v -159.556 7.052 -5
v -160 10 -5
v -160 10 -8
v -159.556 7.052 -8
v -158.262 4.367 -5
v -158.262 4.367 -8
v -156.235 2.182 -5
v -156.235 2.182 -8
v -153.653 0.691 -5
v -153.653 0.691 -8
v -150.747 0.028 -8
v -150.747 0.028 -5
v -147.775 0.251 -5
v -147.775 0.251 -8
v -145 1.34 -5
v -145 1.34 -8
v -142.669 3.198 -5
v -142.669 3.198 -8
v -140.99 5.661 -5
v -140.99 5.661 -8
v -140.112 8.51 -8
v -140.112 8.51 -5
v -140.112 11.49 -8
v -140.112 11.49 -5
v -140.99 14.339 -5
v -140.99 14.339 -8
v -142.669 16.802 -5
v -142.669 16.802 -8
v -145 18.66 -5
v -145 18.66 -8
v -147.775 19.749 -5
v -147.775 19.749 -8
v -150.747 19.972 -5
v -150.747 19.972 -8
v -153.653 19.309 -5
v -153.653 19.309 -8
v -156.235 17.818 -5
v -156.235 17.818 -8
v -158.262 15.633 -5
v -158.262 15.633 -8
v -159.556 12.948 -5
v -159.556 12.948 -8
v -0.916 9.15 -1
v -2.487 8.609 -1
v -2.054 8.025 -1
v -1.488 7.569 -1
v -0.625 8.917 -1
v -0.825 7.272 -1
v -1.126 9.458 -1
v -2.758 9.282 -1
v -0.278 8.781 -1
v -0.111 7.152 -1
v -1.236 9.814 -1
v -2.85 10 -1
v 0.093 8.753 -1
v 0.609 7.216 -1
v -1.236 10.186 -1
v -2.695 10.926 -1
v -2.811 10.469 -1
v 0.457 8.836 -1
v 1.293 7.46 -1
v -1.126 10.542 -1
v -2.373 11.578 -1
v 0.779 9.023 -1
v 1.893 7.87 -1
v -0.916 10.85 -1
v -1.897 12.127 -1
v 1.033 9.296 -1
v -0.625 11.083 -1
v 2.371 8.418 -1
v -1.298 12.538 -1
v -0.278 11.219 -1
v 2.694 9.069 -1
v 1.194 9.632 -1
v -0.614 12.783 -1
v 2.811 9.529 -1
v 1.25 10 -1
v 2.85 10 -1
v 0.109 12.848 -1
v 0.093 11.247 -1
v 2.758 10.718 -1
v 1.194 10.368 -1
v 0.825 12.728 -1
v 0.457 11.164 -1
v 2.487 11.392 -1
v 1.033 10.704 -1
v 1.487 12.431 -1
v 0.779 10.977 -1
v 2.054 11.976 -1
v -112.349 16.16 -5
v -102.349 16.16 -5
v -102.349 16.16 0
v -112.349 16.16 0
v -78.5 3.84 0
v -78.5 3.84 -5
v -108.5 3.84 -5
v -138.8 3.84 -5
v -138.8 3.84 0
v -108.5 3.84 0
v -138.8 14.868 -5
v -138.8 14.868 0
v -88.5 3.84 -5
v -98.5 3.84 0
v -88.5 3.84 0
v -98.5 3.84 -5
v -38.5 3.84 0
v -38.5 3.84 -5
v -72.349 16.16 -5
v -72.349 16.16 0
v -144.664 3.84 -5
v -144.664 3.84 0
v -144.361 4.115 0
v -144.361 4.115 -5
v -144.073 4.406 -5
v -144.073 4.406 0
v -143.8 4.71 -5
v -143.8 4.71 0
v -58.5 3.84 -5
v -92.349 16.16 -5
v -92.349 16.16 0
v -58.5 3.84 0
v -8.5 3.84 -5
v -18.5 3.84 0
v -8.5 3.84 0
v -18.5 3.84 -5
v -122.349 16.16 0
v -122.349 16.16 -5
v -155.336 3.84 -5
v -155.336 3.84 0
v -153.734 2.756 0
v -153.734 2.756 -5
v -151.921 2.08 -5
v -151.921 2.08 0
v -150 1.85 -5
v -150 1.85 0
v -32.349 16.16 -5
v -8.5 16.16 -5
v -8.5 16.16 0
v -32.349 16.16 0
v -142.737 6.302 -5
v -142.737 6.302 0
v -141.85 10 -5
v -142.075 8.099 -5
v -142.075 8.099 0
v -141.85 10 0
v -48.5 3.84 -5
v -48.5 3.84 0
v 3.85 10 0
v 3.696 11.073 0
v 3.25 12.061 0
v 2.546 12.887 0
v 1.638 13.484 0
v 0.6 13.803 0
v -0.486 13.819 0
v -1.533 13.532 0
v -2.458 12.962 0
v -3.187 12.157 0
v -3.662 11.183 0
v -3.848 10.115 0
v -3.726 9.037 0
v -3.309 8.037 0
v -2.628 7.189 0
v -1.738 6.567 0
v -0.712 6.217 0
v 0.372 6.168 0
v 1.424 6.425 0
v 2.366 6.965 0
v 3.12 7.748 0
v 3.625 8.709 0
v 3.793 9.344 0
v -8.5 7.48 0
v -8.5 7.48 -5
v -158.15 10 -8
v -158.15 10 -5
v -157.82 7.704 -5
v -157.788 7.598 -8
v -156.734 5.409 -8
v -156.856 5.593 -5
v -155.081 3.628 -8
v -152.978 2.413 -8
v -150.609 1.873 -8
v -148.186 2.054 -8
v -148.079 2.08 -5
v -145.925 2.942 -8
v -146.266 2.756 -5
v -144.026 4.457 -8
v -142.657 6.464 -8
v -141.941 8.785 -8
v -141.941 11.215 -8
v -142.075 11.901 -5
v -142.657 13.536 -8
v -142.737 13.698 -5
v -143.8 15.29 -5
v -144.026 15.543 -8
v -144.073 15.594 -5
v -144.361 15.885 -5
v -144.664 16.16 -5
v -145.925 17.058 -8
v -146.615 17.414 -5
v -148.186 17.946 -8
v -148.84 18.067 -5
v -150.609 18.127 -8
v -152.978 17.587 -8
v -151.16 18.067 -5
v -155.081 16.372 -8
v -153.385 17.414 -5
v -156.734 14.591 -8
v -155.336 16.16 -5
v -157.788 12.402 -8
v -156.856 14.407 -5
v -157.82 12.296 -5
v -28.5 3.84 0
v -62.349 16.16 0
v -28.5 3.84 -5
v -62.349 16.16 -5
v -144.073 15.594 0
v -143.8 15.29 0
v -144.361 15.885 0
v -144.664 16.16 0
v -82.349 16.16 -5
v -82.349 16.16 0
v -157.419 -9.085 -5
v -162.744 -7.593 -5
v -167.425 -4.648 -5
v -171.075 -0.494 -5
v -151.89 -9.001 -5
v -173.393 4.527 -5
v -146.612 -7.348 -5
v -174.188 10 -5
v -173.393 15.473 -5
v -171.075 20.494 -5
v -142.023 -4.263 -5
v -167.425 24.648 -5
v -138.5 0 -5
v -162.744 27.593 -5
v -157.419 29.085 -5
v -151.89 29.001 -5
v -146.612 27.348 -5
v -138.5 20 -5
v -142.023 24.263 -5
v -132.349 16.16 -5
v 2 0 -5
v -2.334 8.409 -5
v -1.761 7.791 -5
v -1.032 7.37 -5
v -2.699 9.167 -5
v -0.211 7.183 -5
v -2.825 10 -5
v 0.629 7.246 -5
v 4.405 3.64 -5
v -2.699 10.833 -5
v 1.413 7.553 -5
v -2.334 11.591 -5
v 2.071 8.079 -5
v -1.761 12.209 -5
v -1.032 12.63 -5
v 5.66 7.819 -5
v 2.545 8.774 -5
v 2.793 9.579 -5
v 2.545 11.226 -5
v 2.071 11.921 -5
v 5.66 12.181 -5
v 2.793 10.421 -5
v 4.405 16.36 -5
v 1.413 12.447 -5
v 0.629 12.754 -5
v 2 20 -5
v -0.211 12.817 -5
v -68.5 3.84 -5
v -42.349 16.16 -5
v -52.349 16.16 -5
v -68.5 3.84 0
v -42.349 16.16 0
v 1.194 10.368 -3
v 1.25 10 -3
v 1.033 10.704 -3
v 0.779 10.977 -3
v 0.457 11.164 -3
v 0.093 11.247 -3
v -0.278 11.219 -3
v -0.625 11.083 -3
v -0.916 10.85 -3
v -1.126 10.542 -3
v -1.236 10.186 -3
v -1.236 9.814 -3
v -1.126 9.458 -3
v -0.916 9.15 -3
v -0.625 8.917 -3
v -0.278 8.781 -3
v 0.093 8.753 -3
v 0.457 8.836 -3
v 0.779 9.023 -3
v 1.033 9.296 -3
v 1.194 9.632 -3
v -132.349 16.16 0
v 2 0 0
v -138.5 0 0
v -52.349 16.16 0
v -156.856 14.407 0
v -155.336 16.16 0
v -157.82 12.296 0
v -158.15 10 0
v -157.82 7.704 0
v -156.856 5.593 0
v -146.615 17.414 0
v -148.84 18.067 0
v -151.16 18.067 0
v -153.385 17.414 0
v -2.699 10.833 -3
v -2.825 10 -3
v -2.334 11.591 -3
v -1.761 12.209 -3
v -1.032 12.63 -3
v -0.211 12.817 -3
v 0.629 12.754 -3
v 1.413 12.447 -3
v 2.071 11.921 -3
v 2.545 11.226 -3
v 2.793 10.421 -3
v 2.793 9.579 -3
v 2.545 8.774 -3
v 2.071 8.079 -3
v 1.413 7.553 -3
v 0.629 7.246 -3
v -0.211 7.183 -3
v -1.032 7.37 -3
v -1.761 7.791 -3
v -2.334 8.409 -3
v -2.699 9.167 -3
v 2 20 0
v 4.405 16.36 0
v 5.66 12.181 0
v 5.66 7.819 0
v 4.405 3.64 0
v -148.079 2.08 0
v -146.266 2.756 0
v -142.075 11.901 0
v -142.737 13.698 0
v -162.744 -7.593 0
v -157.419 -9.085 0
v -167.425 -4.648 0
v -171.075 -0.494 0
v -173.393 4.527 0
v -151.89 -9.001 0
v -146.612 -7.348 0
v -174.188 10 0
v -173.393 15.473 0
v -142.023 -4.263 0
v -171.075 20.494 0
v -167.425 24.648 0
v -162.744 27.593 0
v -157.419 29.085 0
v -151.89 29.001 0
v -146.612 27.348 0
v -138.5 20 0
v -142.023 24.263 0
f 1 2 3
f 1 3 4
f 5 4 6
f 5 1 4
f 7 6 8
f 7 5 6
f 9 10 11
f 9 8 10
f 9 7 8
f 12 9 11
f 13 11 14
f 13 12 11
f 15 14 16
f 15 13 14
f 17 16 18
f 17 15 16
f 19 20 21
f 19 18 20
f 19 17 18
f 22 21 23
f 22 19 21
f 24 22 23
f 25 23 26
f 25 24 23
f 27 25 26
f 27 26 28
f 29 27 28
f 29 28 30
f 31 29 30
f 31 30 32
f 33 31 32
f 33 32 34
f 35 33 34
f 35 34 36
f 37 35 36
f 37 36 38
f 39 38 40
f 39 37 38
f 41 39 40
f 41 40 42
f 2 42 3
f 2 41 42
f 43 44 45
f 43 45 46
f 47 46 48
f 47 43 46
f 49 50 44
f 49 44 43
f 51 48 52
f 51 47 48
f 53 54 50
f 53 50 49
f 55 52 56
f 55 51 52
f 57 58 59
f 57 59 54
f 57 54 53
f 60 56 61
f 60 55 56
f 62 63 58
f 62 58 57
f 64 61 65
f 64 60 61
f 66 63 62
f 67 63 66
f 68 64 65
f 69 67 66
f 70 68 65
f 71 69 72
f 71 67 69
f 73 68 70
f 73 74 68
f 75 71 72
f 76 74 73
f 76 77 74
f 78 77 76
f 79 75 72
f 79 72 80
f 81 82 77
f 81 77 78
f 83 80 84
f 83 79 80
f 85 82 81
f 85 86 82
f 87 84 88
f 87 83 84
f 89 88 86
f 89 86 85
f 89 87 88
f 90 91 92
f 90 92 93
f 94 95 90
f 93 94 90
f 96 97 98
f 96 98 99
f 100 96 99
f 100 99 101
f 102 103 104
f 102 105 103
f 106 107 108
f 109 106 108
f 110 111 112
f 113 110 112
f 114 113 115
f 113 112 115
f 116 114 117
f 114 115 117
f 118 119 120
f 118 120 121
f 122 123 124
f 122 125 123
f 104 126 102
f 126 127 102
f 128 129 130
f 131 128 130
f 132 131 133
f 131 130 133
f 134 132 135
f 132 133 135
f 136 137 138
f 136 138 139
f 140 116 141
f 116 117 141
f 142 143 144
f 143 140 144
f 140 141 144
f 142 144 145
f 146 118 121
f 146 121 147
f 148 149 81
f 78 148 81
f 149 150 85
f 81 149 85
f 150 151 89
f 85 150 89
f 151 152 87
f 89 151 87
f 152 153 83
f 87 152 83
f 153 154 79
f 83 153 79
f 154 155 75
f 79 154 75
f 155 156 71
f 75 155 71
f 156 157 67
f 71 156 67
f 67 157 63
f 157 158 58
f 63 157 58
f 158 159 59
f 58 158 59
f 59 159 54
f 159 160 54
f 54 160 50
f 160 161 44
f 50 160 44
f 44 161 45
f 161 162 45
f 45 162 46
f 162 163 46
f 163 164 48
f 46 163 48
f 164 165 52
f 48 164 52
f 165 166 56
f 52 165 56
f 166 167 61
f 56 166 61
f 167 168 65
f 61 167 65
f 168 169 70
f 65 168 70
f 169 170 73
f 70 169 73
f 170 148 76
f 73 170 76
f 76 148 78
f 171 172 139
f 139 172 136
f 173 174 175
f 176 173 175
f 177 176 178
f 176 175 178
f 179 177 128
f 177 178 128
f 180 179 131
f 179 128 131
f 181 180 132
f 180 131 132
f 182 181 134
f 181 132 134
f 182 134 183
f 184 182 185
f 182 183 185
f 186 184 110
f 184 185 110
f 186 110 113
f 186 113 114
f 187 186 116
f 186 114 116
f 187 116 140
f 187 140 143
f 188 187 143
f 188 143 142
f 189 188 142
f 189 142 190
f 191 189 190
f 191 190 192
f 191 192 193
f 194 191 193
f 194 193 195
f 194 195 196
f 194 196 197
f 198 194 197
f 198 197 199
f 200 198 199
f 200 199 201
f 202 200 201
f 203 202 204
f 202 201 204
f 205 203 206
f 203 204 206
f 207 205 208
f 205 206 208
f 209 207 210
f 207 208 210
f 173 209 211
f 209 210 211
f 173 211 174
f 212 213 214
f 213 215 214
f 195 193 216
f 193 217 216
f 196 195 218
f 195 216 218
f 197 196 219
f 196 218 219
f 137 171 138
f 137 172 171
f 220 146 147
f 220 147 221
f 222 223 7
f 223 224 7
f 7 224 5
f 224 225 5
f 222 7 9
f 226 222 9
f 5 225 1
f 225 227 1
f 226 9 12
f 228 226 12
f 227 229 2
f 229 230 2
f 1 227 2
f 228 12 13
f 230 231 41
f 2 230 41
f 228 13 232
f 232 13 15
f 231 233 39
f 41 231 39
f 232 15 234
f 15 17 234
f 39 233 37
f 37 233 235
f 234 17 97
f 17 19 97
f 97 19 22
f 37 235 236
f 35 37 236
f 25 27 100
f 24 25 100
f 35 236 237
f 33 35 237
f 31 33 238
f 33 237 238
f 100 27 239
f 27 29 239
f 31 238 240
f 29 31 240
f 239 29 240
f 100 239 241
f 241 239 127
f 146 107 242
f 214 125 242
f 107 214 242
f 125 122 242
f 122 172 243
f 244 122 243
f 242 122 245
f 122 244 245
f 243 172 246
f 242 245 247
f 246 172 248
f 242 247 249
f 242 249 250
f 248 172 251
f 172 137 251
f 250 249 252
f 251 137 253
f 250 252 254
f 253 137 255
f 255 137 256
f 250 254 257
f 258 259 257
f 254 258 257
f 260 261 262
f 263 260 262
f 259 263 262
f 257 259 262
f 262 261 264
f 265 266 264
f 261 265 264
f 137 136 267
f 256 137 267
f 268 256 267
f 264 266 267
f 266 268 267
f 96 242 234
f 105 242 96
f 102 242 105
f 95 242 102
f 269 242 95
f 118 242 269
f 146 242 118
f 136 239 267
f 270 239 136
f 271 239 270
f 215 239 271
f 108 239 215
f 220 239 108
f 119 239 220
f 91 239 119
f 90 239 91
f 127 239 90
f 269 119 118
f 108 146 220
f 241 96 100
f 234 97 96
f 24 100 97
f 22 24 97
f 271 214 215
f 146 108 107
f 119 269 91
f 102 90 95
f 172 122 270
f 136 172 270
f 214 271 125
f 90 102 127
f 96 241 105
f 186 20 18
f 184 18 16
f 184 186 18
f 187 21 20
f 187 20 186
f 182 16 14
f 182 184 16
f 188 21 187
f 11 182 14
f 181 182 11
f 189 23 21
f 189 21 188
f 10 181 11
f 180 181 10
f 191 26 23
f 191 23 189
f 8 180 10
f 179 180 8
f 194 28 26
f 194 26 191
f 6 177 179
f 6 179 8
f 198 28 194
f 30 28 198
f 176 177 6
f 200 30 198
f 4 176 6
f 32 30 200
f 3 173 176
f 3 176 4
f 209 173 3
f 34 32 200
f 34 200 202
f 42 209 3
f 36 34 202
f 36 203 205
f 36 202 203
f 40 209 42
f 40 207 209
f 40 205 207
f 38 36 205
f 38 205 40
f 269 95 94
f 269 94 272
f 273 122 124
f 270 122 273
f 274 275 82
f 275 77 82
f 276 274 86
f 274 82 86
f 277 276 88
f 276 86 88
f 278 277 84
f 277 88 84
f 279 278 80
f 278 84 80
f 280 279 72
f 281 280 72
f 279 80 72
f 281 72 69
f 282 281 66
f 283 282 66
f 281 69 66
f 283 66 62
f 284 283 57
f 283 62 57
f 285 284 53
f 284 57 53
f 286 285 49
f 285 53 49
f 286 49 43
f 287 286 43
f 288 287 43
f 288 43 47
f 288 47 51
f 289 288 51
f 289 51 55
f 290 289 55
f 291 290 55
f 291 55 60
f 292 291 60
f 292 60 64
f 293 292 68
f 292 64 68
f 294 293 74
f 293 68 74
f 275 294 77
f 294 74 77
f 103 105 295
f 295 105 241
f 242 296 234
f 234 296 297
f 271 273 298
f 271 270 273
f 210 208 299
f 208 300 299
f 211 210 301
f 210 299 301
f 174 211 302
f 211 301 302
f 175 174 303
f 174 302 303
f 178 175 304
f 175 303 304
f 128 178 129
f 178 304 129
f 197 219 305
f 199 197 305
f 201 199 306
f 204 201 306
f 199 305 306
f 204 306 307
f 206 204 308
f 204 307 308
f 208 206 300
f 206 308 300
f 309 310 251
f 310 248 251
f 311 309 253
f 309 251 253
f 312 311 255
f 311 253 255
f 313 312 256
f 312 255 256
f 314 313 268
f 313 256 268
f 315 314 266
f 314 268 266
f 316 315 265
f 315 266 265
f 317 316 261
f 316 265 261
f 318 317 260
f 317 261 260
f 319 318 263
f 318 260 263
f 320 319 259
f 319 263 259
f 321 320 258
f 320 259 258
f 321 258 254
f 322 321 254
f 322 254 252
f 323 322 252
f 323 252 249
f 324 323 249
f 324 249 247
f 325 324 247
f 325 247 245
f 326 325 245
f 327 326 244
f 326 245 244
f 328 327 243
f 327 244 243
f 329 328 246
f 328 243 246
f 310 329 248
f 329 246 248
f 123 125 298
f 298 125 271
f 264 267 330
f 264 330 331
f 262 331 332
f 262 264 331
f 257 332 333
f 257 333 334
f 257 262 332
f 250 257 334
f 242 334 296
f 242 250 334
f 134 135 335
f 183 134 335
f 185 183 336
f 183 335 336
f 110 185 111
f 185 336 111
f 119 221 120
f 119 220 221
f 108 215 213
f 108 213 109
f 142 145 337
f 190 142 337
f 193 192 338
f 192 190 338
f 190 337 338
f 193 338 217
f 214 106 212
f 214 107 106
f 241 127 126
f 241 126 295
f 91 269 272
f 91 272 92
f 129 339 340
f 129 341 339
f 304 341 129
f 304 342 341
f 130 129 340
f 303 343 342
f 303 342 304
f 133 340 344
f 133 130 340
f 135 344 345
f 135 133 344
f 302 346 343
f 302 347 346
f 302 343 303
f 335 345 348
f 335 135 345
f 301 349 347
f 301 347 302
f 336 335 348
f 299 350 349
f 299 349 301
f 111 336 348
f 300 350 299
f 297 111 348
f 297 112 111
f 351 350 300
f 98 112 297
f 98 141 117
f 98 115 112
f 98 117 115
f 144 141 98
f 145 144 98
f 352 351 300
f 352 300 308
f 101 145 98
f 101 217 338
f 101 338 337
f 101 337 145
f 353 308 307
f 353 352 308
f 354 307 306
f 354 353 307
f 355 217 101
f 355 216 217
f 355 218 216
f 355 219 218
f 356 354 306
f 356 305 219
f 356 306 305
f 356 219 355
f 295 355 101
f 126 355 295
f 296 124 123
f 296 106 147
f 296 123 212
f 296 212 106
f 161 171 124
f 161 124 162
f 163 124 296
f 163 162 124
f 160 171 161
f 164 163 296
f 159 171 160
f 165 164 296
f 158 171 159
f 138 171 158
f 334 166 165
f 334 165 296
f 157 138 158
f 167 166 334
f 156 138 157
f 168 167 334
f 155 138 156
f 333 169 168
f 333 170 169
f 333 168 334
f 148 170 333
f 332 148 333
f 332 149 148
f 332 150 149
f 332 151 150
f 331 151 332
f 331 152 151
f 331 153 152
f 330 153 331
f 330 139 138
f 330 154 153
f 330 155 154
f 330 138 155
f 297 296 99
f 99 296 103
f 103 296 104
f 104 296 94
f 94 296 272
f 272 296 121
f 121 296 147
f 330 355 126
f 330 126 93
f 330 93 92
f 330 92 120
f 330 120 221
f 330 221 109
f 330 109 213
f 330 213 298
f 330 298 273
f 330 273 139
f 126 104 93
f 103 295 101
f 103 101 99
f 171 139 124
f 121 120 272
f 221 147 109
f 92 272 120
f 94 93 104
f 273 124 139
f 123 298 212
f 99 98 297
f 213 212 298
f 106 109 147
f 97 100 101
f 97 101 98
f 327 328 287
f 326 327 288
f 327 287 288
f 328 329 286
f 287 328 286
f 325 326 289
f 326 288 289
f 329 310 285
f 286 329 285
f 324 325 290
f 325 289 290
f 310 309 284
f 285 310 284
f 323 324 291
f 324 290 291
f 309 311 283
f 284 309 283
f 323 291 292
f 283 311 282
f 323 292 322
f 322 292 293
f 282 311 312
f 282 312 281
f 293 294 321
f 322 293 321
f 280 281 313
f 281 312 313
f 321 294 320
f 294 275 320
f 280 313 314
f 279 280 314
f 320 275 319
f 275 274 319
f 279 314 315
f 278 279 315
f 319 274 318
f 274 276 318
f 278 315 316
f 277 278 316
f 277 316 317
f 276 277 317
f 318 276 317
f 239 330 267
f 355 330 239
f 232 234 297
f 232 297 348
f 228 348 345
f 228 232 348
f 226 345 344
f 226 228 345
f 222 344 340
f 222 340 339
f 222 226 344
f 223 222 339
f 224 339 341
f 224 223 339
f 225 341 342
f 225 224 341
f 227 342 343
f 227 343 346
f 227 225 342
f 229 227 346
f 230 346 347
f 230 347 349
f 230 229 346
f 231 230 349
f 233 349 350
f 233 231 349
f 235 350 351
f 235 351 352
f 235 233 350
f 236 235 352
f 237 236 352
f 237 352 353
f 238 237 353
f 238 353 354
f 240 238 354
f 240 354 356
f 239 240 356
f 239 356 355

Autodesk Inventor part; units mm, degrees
ref_plane "YZ Plane" through (0, 0, 0) normal (1, 0, 0) x (0, 1, 0)
ref_plane "XZ Plane" through (0, 0, 0) normal (0, 1, 0) x (-1, 0, 0)
sketch "Szkic1" plane through (0, 0, 0) normal (0, 1, 0) x (-1, 0, 0)
  line L0 (0, 0) -> (150, 0)
  line L1 (150, 0) -> (150, -5)
  line L2 (150, -5) -> (0, -5)
  line L3 (0, -5) -> (0, 0)
  dimension "d0" = 150
  dimension "d1" = 5
extrude "Wyciągnięcie proste1" add sketch "Szkic1" along normal blind 20
sketch "Szkic2" plane through (0, 0, -5) normal (0, 0, -1) x (-1, 0, 0)
  line L0 (0, 0) -> (0, 20) projected
  circle A0 centre (0, 10) radius 2.95
  line L1 (0, 20) -> (-2, 20)
  line L2 (0, 0) -> (-2, 0)
  arc A1 (-2, 20) -> (-2, 0) centre (9.1803, 10) ccw
  line L3 (0, 10) -> (150, 10)
  line L4 (150, 10) -> (138.5, 10)
  line L5 (138.5, 10) -> (170.9, 10)
  line L6 (150, 0) -> (150, 20) projected
  line L7 (138.5, 10) -> (170.9, 10) construction
  line L8 (138.5, 10) -> (170.9, 10)
  line L9 (170.9, 10) -> (170.9, 16.16)
  line L10 (170.9, 16.16) -> (138.5, 16.16)
  line L11 (138.5, 16.16) -> (138.5, 10)
  line L12 (138.5, 10) -> (170.9, 10)
  line L13 (170.9, 10) -> (170.9, 3.84)
  line L14 (170.9, 3.84) -> (138.5, 3.84)
  line L15 (138.5, 3.84) -> (138.5, 10)
  line L16 (0, 0) -> (150, 0) projected
  line L17 (0, 20) -> (150, 20) projected
  arc A2 (138.5, 0) -> (138.5, 20) centre (154.9429, 10) ccw
  point P0 (150, 3.84)
  point P1 (150, 16.16)
  point P2 (0, 7.05)
  point P3 (0, 12.95)
  dimension "d4" = 5.9
  dimension "d5" = 2
  dimension "d6" = 2
  dimension "d7" = 15
  dimension "d8" = 150
  dimension "d9" = 11.5
  dimension "d10" = 32.4
  dimension "d11" = 0
  dimension "d12" = 6.16
  dimension "d13" = 6.16
extrude "Wyciągnięcie proste2" add sketch "Szkic2" against normal blind 5 contours L2 A1 L1 L0 A0 | L16 L6 L14 L13 L9 L10 L17 A2
sketch "Szkic3" plane through (2, 20, -5) normal (0, 0, -1) x (-1, 0, 0)
  arc A0 (2, -7.05) -> (2, -12.95) centre (2, -10) ccw projected
  circle A1 centre (2, -10) radius 2.95
  line L0 (152, -16.16) -> (152, -3.84) projected
  line L1 (152, -16.16) -> (150.5, -16.16)
  line L2 (150.5, -16.16) -> (150.5, -3.84)
  line L3 (150.5, -3.84) -> (152, -3.84)
  line L4 (140.5, -16.16) -> (10.5, -16.16)
  line L5 (10.5, -16.16) -> (10.5, -3.84)
  line L6 (10.5, -3.84) -> (140.5, -3.84)
  line L7 (140.5, -3.84) -> (140.5, -16.16)
  line L8 (150.5, -16.16) -> (150.3, -16.16)
  line L9 (150.3, -16.16) -> (150.3, -3.84)
  line L10 (150.3, -3.84) -> (150.5, -3.84)
  line L11 (152, -16.16) -> (140.5, -16.16)
  line L12 (140.5, -16.16) -> (140.5, -3.84)
  line L13 (140.5, -3.84) -> (152, -3.84)
  line L14 (152, -3.84) -> (152, -16.16)
  point P0 (2, -20)
  dimension "d16" = 1.5
  dimension "d17" = 130
  dimension "d18" = 12.32
  dimension "d21" = 0.2
  dimension "d24" = 11.5
extrude "Wyciągnięcie proste3" cut sketch "Szkic3" against normal through all
sketch "Szkic5" plane through (2, 20, -5) normal (0, 0, -1) x (-1, 0, 0)
  circle A0 centre (2, -10) radius 2.95 projected
  line L0 (2, -10) -> (152, -10)
  line L1 (2, -10) -> (152, -10) construction
  circle A1 centre (152, -10) radius 5.0551
  line L2 (152, -10) -> (145.8, -10)
  line L3 (145.8, -10) -> (145.8, -3.84)
  line L4 (10.5, -3.84) -> (172.9, -3.84) projected
  line L5 (145.8, -3.84) -> (140.8, -3.84)
  line L6 (140.8, -3.84) -> (140.8, -16.16)
  line L7 (172.9, -16.16) -> (10.5, -16.16) projected
  line L8 (145.8, -10) -> (145.8, -16.16)
  line L9 (145.8, -16.16) -> (140.8, -16.16)
  line L10 (10.5, -16.16) -> (10.5, -3.84) projected
  line L11 (10.5, -16.16) -> (44.3489, -3.84)
  line L12 (10.5, -16.16) -> (46.5213, -16.16) construction
  line L13 (44.3489, -3.84) -> (54.3489, -3.84)
  line L14 (10.5, -16.16) -> (20.5, -16.16)
  line L15 (20.5, -16.16) -> (54.3489, -3.84)
  line L16 (20.5, -16.16) -> (30.5, -16.16)
  line L17 (54.3489, -3.84) -> (64.3489, -3.84)
  line L18 (64.3489, -3.84) -> (30.5, -16.16)
  line L19 (44.3489, -3.84) -> (34.3489, -3.84)
  line L20 (10.5, -16.16) -> (0.5, -16.16)
  line L21 (0.5, -16.16) -> (34.3489, -3.84)
  line L22 (40.5, -16.16) -> (74.3489, -3.84)
  line L23 (50.5, -16.16) -> (84.3489, -3.84)
  line L24 (94.3489, -3.84) -> (60.5, -16.16)
  line L25 (30.5, -16.16) -> (64.3489, -3.84)
  line L26 (70.5, -16.16) -> (104.3489, -3.84)
  line L27 (80.5, -16.16) -> (114.3489, -3.84)
  line L28 (124.3489, -3.84) -> (90.5, -16.16)
  line L29 (60.5, -16.16) -> (94.3489, -3.84)
  line L30 (100.5, -16.16) -> (134.3489, -3.84)
  line L31 (110.5, -16.16) -> (144.3489, -3.84)
  line L32 (90.5, -16.16) -> (124.3489, -3.84)
  point P0 (2, -20)
  point P1 (10.5, -12.5203)
  point P2 (60.5, -16.16)
  point P3 (140.8, -5.1317)
  dimension "d25" = 150
  dimension "d26" = 0
  dimension "d27" = 6.2
  dimension "d28" = 5
  dimension "d29" = 20
  dimension "d30" = 10
  dimension "d31" = 10
  dimension "d32" = 10
  dimension "d33" = 10
  dimension "d34" = 10
  dimension "d35" = 10
  dimension "d36" = 10
  dimension "d37" = 10
  dimension "d38" = 10
  dimension "d39" = 10
  dimension "d40" = 10
  dimension "d41" = 10
  dimension "d42" = 10
  dimension "d43" = 10
  dimension "d44" = 10
  dimension "d45" = 10
  dimension "d46" = 10
  dimension "d47" = 10
  dimension "d48" = 10
  dimension "d49" = 10
  dimension "d52" = 10
  dimension "d53" = 10
extrude "Wyciągnięcie proste4" add sketch "Szkic5" against normal blind 5 contours L21 L4 L11 L0 | L0 L11 L10 L21 | L15 L4 L18 L0 | L0 L18 L7 L15 | L22 L4 L23 L0 | L0 L23 L7 L22 | L24 L4 L26 L0 | L0 L26 L7 L24 | L27 L4 L28 L0 | L0 L28 L7 L27 | L30 L4 L6 L31 L0 | L0 L31 L7 L30 | L6 L31 L4 L3 L0 | L0 L8 L7 L6 | L6 L4 L31
sketch "Szkic6" plane through (-138.5, 0, 0) normal (0, 0, 1) x (1, 0, 0)
  circle A0 centre (138.5, 10) radius 2.95 projected
  circle A1 centre (138.5, 10) radius 2.85
  circle A2 centre (138.5, 10) radius 2.95
  point P0 (138.5, 0)
  dimension "d56" = 5.7
extrude "Wyciągnięcie proste5" add sketch "Szkic6" against normal blind 5
ref_plane "Płaszczyzna konstrukcyjna1" through (-138.5, 0, -1) normal (0, 0, 1) x (1, 0, 0)
sketch "Szkic7" plane through (-138.5, 0, -1) normal (0, 0, 1) x (1, 0, 0)
  circle A0 centre (138.5, 10) radius 2.85 projected
  circle A1 centre (138.5, 10) radius 1.25
  circle A2 centre (138.5, 10) radius 2.85
  point P0 (138.5, 0)
  dimension "d60" = 2.5
extrude "Wyciągnięcie proste6" add sketch "Szkic7" against normal blind 2
sketch "Szkic8" plane through (-138.5, 0, 0) normal (0, 0, 1) x (1, 0, 0)
  point P0 (138.5, 0)
sketch "Szkic9" plane through (-138.5, 0, 0) normal (0, 0, 1) x (1, 0, 0)
  circle A0 centre (138.5, 10) radius 1.25 projected
  line L0 (138.5, 10) -> (-11.5, 10)
  line L1 (138.5, 10) -> (288.5, 10) construction
  circle A1 centre (-11.5, 10) radius 8.15
  point P0 (138.5, 0)
  dimension "d63" = 150
  dimension "d64" = 180
  dimension "d65" = 16.3
extrude "Wyciągnięcie proste7" cut sketch "Szkic9" against normal through all contours A1
sketch "Szkic10" plane through (-138.5, 0, 0) normal (0, 0, 1) x (1, 0, 0)
  arc A0 (-5.3, 4.7102) -> (-5.3, 15.2898) centre (-11.5, 10) ccw projected
  circle A1 centre (-11.5, 10) radius 8.15
  line L0 (-32.5164, 20) -> (-2.9538, 20)
  line L1 (-2.9538, 20) -> (-2.9538, 1.85)
  line L2 (-2.9538, 1.85) -> (-32.5164, 1.85)
  line L3 (-32.5164, 1.85) -> (-32.5164, 20)
  point P0 (138.5, 0)
  point P1 (-11.5, 1.85)
  point P2 (-5.3, 15.2898)
extrude "Wyciągnięcie proste8" add sketch "Szkic10" against normal blind 5
sketch "Szkic11" plane through (2, 20, -5) normal (0, 0, -1) x (-1, 0, 0)
  circle A0 centre (152, -10) radius 8.15 projected
  circle A1 centre (152, -10) radius 8.15
  circle A2 centre (152, -10) radius 10
  point P0 (2, -20)
  dimension "d70" = 20
extrude "Wyciągnięcie proste9" add sketch "Szkic11" along normal blind 3
sketch "Szkic12" plane through (-138.5, 0, 0) normal (0, 0, 1) x (1, 0, 0)
  line L0 (135.65, 12.85) -> (141.4166, 12.85)
  line L1 (141.4166, 12.85) -> (141.4166, 7.15)
  line L2 (141.4166, 7.15) -> (135.65, 7.15)
  line L3 (135.65, 7.15) -> (135.65, 12.85)
  circle A0 centre (138.5, 10) radius 2.85 projected
  line L4 (141.35, 10) -> (141.35, 7.15)
  line L5 (141.35, 10) -> (141.35, 12.85)
  point P0 (138.5, 0)
extrude "Wyciągnięcie proste10" cut sketch "Szkic12" against normal blind 0.5 contours A0
chamfer "Faza1" distance 1 angle 45 1 edges at (-2.85, 10, 0)
sketch "Szkic13" plane through (2, 20, -5) normal (0, 0, -1) x (-1, 0, 0)
  circle A0 centre (2, -10) radius 2.85 projected
  circle A1 centre (2, -10) radius 2.85
  circle A2 centre (2, -10) radius 2.825
  point P0 (2, -20)
  dimension "d78" = 5.65
extrude "Wyciągnięcie proste11" add sketch "Szkic13" against normal blind 4
properties part number "arm_v3_backup"
